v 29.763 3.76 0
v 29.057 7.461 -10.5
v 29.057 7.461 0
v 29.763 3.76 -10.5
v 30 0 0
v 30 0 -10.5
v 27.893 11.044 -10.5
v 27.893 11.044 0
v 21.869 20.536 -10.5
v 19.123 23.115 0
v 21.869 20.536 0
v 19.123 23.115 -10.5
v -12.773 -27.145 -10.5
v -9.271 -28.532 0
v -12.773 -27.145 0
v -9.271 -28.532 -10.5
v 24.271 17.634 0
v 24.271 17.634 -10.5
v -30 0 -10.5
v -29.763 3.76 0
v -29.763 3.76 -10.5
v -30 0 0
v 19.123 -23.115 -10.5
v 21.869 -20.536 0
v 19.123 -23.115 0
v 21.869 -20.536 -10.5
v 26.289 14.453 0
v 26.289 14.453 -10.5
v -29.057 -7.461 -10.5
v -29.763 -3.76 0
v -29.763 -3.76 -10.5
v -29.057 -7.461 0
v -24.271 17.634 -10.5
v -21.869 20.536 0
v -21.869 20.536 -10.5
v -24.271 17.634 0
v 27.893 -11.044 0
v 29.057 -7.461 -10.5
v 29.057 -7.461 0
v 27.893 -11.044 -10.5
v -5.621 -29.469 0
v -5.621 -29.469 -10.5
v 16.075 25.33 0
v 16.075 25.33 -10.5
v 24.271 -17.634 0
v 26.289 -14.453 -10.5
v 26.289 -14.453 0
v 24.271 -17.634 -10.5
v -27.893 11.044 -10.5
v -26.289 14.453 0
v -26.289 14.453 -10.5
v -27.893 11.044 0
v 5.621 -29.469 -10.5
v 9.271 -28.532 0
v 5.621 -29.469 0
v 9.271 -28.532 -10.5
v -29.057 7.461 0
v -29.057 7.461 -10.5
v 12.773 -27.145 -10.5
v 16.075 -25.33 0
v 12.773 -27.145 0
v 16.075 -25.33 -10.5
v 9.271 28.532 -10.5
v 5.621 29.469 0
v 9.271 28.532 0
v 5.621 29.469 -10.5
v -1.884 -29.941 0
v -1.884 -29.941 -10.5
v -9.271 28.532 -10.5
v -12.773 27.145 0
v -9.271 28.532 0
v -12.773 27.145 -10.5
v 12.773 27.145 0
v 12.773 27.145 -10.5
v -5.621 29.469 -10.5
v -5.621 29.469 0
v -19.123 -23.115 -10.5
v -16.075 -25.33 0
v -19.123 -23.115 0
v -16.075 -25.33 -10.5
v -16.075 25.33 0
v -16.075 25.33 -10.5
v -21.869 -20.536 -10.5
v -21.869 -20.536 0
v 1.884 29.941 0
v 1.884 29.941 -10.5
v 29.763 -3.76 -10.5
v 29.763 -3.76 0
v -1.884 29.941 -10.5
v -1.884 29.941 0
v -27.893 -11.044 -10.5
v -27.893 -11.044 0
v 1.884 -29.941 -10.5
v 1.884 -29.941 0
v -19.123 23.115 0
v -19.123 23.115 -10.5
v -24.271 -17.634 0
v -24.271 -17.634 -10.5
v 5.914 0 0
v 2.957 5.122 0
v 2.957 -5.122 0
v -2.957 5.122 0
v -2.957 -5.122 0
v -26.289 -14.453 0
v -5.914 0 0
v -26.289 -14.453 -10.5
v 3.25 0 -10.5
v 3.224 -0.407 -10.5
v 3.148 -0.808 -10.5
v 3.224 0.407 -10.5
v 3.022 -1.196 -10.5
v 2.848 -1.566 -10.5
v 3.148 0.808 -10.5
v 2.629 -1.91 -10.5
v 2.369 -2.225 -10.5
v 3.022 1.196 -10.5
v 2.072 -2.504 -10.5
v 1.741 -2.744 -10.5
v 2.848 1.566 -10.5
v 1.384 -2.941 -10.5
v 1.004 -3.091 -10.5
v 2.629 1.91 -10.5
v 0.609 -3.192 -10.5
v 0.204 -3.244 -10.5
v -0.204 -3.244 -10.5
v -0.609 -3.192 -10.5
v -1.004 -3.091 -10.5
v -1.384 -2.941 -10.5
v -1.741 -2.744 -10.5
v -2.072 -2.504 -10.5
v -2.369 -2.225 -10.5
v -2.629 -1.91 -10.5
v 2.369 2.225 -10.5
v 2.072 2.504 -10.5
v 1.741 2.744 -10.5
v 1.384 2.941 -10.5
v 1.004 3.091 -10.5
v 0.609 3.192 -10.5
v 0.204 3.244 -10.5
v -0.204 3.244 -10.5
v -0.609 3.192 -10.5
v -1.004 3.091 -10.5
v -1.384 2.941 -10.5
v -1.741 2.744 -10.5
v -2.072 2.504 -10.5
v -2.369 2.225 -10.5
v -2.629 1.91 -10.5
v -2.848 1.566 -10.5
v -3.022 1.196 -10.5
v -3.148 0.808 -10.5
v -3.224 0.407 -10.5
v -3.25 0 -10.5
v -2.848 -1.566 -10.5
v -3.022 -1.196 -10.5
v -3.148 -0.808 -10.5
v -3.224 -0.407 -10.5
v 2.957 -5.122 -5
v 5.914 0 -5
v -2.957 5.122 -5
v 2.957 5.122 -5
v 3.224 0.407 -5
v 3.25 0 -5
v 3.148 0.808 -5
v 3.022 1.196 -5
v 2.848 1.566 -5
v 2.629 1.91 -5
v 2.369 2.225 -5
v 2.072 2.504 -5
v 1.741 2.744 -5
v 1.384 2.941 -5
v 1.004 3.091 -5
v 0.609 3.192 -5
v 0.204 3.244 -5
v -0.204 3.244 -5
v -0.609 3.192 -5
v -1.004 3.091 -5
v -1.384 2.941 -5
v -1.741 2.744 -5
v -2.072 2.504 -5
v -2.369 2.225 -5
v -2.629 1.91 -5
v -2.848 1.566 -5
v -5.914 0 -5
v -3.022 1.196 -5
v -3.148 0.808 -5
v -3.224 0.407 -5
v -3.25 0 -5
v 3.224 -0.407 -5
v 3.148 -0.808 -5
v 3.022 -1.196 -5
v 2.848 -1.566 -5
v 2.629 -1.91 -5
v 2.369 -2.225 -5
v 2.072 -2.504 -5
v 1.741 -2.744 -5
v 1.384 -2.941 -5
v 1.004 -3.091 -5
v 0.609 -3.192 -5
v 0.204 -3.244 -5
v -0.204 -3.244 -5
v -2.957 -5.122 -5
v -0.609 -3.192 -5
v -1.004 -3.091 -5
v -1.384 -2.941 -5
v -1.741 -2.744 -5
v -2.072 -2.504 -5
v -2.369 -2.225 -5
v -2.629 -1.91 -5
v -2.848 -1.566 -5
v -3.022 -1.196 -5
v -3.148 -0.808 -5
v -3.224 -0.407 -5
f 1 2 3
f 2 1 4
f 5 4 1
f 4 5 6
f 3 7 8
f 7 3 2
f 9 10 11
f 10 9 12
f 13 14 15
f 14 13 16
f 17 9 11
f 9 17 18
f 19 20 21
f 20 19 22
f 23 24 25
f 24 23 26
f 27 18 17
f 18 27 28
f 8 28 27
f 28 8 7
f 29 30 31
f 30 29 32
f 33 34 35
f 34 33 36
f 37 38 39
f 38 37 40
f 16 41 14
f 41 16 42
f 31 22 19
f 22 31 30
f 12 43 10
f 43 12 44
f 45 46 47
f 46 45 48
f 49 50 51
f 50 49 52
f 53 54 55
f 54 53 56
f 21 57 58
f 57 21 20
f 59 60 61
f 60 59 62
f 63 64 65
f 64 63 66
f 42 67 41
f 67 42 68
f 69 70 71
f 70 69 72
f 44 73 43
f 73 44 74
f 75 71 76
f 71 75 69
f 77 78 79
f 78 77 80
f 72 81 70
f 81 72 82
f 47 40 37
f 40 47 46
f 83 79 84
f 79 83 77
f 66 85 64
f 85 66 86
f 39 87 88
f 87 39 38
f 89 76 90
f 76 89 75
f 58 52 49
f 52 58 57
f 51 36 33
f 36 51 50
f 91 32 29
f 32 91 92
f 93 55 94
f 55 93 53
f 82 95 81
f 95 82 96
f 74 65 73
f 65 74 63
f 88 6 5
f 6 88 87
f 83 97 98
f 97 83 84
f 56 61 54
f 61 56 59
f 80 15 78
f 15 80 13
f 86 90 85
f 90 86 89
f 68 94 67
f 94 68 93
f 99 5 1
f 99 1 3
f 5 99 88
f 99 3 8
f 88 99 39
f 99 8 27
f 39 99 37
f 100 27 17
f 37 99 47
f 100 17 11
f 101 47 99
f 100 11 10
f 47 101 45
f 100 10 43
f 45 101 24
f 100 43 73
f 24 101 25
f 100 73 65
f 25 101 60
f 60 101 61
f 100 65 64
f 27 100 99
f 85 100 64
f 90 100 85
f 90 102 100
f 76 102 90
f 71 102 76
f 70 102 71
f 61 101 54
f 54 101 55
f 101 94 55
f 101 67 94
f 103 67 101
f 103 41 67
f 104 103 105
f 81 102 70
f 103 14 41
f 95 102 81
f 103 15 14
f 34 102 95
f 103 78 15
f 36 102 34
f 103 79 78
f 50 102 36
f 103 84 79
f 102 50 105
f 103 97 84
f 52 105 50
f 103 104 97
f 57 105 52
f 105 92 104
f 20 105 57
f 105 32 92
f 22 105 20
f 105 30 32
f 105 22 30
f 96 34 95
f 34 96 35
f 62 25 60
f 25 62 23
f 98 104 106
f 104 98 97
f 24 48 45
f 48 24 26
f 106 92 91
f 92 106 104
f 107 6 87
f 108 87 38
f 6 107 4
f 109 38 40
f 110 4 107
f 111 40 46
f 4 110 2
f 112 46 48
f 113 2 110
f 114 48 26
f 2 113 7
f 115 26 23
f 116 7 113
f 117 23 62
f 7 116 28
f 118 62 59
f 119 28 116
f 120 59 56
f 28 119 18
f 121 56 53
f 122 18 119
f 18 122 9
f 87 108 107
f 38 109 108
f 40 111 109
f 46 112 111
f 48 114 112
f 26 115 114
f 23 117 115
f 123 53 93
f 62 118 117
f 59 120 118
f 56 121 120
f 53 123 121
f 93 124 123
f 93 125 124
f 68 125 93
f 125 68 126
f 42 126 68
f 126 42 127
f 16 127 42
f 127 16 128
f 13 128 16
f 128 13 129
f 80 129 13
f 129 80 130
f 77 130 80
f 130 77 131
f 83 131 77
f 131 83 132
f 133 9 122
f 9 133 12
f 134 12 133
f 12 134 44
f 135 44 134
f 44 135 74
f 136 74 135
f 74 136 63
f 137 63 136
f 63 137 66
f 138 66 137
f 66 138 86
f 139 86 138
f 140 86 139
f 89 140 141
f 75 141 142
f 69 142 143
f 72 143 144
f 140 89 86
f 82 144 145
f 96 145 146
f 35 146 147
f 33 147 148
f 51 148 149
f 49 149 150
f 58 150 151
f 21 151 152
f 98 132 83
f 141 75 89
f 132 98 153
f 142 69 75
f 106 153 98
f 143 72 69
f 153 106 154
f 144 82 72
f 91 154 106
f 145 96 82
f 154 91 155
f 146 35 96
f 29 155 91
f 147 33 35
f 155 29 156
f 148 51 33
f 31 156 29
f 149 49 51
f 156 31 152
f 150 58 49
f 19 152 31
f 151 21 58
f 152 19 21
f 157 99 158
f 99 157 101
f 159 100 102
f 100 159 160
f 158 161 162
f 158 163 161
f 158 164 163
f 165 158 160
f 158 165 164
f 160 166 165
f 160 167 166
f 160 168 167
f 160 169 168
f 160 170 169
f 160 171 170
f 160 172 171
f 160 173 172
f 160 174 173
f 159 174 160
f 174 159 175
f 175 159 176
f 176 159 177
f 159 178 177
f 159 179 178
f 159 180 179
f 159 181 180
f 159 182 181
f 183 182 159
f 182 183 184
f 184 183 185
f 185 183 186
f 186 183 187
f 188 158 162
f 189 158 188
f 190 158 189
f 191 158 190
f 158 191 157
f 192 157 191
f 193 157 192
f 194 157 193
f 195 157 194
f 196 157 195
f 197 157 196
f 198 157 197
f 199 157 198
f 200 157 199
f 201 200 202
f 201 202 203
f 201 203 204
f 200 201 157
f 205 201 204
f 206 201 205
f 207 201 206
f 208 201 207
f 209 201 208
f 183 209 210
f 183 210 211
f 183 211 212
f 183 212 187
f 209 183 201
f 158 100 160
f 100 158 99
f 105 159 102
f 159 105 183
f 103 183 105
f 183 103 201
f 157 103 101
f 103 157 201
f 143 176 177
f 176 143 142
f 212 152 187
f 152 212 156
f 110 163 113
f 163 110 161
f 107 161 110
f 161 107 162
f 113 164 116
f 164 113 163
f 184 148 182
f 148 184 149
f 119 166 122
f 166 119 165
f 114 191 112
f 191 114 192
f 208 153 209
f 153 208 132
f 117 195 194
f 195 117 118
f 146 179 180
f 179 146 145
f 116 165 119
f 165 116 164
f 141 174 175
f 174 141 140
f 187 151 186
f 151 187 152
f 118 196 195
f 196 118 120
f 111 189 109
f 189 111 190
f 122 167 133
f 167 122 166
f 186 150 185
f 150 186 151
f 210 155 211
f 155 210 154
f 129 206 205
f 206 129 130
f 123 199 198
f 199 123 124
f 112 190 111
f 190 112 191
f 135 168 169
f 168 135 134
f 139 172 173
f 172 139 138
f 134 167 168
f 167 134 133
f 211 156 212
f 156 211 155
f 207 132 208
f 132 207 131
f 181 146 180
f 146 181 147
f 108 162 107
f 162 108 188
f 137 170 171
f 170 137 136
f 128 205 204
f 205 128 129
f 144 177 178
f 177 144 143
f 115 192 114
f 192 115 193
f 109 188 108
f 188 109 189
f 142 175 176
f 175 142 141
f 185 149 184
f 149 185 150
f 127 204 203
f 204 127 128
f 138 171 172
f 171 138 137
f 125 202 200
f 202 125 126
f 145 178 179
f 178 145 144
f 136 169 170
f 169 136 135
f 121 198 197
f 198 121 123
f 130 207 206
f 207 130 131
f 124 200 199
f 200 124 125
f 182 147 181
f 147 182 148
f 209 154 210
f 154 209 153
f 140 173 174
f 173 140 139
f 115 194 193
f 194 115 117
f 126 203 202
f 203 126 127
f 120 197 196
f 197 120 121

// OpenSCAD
$fn = 50;


difference() {
	union() {
		translate(v = [0, 0, -10.5000000000]) {
			cylinder(h = 10.5000000000, r = 30.0000000000);
		}
		#translate(v = [0, 0, -12.0000000000]) {
			cylinder(h = 12, r = 2.8750000000);
		}
	}
	union() {
		translate(v = [0, 0, 0]) {
			rotate(a = [0, 0, 0]) {
				difference() {
					union() {
						translate(v = [0, 0, -5]) {
							linear_extrude(height = 5) {
								polygon(points = [[5.9142500000, 0.0000000000], [2.9571250000, 5.1218907443], [-2.9571250000, 5.1218907443], [-5.9142500000, 0.0000000000], [-2.9571250000, -5.1218907443], [2.9571250000, -5.1218907443]]);
							}
						}
					}
					union();
				}
			}
		}
		#translate(v = [0, 0, -100.0000000000]) {
			cylinder(h = 200, r = 3.2500000000);
		}
	}
}
